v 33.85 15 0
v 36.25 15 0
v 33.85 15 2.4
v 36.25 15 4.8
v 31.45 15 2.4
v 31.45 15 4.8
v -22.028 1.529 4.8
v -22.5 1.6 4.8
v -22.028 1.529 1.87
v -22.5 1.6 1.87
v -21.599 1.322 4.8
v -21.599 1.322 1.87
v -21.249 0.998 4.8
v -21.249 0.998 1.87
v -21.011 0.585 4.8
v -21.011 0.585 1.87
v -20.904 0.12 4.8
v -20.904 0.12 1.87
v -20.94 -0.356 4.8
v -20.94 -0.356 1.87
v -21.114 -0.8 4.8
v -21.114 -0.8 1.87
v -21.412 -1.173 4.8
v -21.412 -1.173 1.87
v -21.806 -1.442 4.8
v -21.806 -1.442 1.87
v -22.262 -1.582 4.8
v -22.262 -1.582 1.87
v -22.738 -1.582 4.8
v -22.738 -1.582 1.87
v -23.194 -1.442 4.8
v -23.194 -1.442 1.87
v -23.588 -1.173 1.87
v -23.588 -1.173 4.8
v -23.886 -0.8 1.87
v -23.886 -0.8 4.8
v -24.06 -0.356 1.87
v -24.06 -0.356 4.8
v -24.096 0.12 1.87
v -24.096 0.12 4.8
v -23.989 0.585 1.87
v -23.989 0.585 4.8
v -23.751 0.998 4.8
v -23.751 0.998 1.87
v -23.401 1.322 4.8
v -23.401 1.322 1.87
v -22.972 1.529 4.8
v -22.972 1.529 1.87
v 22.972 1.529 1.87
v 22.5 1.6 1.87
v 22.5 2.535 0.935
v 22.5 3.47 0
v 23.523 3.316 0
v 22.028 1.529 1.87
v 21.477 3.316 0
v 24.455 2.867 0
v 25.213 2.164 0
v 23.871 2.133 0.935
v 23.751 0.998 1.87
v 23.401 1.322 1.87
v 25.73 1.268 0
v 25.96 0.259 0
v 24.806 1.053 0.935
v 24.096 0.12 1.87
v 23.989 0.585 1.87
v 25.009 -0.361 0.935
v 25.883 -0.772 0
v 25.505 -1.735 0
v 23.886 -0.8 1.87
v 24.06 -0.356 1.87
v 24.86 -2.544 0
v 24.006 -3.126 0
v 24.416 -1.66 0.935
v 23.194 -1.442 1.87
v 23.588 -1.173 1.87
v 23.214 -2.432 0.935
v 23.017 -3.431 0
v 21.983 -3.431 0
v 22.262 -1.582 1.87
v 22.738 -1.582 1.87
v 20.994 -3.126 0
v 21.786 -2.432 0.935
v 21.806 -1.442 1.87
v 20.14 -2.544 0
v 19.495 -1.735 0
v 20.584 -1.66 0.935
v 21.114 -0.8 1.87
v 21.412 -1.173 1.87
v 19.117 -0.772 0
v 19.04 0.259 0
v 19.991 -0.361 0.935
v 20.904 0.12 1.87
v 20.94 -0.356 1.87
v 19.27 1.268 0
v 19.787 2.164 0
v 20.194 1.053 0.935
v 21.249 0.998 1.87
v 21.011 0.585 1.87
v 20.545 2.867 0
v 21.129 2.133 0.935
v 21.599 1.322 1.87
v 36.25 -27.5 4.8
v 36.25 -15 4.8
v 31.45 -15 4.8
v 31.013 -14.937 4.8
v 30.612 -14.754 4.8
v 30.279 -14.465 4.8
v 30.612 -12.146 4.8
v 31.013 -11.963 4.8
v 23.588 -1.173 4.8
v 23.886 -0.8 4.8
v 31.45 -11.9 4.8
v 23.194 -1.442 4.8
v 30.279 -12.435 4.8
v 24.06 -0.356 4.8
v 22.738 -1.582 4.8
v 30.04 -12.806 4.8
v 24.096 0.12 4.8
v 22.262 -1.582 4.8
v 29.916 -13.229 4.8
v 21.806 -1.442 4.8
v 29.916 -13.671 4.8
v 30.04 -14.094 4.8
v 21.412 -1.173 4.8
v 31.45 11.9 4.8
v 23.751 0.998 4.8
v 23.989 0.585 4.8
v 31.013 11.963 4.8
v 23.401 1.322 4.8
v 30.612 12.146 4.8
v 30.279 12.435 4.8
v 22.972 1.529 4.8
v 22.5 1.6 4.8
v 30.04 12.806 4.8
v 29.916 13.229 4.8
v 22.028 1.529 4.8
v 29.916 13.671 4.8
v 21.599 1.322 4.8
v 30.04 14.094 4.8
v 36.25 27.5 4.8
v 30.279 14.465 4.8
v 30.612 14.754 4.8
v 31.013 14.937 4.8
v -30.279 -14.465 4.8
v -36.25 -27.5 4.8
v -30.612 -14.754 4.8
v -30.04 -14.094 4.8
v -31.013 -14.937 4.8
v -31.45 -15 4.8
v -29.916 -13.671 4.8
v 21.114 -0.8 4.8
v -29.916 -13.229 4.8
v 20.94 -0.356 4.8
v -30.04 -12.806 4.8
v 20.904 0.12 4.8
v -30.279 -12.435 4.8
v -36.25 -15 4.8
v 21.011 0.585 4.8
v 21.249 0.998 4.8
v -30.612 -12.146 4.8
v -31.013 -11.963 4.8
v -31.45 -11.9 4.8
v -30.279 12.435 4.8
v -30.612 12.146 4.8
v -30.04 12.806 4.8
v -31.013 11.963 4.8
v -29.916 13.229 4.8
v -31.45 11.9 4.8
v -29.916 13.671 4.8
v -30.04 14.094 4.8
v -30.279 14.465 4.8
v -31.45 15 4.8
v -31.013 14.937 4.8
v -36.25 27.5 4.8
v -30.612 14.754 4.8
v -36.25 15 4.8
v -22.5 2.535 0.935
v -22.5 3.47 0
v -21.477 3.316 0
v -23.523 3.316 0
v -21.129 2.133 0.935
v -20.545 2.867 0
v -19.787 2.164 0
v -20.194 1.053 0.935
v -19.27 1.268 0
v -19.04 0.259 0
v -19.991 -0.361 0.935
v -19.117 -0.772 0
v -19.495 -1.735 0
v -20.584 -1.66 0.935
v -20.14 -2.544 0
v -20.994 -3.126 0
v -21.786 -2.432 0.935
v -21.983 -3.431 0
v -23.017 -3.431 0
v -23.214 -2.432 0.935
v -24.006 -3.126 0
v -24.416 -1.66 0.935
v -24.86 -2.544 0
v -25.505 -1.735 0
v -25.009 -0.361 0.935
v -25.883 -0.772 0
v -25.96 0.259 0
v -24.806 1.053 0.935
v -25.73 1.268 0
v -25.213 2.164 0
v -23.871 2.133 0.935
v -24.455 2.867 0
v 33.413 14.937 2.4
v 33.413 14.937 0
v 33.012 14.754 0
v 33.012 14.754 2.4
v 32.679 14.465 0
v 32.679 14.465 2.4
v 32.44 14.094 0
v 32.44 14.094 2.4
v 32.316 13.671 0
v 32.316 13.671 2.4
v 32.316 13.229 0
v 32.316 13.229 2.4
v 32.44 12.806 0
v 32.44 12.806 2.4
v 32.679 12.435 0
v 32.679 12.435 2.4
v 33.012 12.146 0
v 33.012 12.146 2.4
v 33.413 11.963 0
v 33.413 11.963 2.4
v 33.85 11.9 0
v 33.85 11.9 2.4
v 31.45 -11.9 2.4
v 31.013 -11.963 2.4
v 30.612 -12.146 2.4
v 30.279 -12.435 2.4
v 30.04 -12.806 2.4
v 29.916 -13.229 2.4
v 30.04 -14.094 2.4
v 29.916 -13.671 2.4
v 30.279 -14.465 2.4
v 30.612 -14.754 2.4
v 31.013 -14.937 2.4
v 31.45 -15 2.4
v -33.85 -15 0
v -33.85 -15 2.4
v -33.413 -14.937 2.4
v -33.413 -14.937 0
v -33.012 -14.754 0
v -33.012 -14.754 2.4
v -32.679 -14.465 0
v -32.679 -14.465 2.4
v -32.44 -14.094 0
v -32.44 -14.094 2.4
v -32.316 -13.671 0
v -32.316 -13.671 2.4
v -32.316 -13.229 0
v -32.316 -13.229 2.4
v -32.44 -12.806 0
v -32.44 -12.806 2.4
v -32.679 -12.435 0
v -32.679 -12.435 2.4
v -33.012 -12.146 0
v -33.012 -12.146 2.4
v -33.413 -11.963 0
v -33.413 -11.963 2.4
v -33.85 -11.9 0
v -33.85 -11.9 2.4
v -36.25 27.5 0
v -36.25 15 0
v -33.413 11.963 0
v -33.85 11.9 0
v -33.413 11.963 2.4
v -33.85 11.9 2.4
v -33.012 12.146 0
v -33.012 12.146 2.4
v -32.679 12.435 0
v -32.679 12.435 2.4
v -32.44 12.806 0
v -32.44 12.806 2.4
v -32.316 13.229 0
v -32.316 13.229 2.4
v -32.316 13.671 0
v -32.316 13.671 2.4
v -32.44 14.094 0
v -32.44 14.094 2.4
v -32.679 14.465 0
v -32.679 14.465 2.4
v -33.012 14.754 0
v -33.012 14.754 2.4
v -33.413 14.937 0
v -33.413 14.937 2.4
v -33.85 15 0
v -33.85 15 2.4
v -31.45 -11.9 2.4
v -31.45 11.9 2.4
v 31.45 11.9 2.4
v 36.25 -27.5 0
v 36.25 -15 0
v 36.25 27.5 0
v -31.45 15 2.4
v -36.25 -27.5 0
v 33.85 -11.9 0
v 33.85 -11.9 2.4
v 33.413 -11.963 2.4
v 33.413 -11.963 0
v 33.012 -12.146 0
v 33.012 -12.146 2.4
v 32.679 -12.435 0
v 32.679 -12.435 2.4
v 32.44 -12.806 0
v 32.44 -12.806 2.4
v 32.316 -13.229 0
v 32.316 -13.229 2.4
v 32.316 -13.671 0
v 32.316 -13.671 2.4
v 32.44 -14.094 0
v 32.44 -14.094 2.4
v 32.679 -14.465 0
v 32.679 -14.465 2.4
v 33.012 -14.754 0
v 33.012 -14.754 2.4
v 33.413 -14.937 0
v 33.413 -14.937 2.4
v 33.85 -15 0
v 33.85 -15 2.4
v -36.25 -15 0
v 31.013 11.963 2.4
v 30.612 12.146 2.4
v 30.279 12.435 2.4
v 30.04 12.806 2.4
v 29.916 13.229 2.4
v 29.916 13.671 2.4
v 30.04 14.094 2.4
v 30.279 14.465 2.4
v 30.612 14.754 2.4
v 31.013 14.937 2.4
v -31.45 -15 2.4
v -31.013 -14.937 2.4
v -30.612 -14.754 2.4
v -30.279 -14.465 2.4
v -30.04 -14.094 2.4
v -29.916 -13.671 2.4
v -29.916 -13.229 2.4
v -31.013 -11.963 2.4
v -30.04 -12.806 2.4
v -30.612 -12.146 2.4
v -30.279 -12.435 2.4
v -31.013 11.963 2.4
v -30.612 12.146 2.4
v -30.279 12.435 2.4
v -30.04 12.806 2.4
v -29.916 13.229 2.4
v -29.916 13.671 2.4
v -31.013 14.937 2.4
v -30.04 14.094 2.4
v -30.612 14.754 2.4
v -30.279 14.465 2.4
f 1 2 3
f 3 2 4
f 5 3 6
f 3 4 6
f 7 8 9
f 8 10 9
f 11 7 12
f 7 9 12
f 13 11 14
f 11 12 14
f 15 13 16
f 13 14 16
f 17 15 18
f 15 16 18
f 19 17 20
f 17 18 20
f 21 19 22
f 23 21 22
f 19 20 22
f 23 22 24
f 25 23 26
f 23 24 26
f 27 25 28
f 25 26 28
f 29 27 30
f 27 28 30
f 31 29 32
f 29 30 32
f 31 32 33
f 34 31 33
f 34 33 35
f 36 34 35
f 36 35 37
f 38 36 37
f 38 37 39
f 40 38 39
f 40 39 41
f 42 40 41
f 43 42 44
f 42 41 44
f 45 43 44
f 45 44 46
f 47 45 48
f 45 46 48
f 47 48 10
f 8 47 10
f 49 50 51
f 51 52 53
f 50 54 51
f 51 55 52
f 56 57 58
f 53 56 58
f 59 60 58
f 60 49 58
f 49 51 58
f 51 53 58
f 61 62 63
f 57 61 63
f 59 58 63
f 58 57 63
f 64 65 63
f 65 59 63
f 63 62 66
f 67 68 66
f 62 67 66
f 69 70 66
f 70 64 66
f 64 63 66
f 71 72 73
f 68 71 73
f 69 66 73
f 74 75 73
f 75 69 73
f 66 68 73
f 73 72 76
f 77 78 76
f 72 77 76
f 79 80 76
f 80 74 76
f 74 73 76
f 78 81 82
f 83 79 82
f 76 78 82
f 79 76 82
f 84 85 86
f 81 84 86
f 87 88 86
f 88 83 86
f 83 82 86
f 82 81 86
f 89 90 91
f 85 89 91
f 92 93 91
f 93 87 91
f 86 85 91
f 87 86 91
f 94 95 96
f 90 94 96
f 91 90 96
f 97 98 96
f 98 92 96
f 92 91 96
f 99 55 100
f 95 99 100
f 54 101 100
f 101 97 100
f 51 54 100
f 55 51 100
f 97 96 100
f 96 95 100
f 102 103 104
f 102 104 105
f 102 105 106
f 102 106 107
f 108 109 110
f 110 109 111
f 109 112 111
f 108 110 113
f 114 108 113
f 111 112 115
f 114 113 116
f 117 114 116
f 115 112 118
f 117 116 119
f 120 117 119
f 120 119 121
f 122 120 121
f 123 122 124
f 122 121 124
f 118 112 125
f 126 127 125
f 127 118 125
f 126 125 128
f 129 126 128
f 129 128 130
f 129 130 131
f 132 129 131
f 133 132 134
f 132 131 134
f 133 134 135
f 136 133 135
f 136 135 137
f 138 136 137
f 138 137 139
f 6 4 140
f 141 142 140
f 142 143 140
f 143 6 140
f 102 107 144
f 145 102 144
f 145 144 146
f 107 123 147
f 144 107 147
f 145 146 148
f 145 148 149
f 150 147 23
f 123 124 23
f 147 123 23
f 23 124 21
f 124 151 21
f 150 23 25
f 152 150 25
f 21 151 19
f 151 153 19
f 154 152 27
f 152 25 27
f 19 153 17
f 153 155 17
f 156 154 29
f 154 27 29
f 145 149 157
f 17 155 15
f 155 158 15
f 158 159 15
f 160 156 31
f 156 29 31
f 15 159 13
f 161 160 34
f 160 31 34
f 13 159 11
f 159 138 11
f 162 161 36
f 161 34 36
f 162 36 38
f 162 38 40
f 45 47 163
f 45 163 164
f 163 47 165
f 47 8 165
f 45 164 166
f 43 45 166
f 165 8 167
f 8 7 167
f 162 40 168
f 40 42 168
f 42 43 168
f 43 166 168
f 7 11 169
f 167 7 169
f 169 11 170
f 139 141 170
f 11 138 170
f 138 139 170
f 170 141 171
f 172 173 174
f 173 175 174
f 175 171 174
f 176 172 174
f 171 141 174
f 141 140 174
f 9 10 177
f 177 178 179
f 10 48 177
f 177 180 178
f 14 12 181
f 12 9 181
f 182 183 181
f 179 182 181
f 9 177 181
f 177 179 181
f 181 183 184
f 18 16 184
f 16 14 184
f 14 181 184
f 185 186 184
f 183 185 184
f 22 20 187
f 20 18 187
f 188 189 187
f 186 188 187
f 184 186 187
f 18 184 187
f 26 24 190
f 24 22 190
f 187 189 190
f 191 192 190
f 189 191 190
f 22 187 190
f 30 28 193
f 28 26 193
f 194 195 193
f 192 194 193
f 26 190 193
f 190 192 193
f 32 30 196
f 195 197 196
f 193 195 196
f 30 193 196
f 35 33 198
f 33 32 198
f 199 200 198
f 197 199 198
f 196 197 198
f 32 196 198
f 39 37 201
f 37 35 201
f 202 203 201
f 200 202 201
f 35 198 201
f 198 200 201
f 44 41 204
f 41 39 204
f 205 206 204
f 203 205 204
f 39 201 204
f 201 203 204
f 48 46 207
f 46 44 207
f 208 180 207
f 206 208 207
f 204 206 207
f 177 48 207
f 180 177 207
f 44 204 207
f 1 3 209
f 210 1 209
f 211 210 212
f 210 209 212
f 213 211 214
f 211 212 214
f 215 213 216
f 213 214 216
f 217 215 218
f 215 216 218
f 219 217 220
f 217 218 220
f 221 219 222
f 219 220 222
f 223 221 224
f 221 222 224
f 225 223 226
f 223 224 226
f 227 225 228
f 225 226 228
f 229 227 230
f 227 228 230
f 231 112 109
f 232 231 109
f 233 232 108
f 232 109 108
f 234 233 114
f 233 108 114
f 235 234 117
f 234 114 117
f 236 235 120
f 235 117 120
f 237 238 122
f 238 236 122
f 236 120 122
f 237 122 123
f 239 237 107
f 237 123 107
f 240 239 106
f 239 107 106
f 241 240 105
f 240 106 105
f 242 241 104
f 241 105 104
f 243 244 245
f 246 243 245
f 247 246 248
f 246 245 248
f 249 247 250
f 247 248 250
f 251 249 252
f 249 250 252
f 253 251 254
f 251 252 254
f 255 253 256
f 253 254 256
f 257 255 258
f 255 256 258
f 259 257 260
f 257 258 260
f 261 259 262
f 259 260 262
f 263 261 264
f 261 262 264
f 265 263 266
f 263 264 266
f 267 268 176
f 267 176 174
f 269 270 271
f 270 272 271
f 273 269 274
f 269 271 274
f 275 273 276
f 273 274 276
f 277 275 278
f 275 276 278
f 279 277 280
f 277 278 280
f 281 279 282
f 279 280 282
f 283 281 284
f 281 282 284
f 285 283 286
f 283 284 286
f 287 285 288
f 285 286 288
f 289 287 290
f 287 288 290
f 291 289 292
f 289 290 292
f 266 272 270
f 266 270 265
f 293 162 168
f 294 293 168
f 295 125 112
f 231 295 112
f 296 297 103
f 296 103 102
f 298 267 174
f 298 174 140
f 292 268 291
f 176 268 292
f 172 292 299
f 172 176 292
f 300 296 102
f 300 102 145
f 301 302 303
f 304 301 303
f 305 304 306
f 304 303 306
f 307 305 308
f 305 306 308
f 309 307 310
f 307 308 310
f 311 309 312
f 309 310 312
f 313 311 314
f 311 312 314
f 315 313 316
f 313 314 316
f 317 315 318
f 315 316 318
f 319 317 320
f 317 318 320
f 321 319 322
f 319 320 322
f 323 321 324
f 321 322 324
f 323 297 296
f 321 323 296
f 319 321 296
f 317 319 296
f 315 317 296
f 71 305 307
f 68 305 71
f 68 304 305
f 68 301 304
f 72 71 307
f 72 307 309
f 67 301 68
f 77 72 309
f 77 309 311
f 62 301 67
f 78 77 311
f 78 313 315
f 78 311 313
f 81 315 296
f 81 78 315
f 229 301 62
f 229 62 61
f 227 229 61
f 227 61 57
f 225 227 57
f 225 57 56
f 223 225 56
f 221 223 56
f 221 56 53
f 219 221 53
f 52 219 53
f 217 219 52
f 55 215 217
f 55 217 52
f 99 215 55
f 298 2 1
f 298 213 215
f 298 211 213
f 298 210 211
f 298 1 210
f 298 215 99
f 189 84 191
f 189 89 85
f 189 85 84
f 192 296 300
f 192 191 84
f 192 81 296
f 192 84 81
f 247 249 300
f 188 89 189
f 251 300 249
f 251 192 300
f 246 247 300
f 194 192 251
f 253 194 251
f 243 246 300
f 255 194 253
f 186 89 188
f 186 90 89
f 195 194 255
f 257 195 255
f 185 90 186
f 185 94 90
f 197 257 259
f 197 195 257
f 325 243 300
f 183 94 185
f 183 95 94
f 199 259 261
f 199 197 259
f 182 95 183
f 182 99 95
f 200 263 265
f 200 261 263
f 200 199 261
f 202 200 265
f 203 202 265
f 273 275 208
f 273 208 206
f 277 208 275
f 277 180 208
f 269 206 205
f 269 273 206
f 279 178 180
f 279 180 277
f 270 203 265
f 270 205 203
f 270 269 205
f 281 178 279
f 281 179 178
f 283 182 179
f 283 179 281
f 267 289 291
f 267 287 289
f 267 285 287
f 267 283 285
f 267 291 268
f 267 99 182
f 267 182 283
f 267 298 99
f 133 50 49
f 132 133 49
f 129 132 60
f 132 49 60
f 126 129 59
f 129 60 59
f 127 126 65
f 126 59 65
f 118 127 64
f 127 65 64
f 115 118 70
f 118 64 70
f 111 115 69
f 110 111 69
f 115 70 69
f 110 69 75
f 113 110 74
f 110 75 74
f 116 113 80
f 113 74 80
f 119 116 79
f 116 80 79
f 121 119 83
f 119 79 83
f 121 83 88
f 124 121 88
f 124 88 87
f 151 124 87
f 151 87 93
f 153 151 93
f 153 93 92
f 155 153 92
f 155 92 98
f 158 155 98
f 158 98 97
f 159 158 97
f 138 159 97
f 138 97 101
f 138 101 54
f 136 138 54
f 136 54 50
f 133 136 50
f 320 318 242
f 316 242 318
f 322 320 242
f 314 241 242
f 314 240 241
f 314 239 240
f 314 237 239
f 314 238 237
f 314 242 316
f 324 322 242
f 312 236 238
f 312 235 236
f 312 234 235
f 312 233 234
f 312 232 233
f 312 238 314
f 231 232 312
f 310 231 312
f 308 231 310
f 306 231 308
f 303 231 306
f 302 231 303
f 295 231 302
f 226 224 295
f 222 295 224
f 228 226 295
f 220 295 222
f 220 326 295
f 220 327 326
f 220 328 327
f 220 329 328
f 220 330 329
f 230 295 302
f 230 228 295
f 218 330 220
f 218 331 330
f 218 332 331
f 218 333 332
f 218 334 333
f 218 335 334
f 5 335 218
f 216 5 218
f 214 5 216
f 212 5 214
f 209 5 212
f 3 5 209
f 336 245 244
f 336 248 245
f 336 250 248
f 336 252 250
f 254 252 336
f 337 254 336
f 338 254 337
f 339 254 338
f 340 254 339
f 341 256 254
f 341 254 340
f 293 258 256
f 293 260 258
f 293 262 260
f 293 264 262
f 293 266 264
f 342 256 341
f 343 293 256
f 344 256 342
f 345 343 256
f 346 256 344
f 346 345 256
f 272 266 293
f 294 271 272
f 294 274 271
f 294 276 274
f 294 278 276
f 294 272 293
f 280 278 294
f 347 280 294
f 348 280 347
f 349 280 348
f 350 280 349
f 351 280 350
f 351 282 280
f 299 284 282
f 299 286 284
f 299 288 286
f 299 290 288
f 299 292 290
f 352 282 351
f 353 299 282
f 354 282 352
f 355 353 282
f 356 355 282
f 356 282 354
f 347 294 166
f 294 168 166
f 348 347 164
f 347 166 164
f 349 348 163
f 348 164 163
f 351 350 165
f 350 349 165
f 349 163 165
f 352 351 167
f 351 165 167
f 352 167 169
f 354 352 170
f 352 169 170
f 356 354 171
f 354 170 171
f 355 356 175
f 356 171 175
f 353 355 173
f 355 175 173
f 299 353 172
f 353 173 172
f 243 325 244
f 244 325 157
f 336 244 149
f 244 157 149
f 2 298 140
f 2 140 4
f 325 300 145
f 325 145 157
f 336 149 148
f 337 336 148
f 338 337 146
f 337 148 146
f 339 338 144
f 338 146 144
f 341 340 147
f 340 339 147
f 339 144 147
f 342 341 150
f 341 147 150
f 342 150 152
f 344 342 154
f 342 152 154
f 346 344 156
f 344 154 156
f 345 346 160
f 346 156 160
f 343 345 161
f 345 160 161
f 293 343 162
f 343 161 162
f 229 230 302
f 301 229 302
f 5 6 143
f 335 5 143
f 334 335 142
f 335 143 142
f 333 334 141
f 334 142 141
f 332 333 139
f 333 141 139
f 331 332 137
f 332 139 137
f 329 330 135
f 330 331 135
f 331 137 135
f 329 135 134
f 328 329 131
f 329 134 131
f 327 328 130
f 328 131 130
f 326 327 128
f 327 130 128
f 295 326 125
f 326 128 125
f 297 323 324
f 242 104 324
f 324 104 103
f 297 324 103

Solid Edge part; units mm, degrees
sketch "Sketch1" plane through (0, 0, 0) normal (0, 0, 1) x (1, 0, 0)
  line L0 (-36.25, 27.5) -> (36.25, 27.5)
  line L1 (36.25, 27.5) -> (36.25, -27.5)
  line L2 (36.25, -27.5) -> (-36.25, -27.5)
  line L3 (-36.25, -27.5) -> (-36.25, 27.5)
extrude "ExtrudedProtrusion_7" add sketch "Sketch1" along normal blind 4.8
sketch "Sketch2" plane through (0, 0, 4.8) normal (0, 0, 1) x (1, 0, 0)
  line L0 (-33.85, -15) -> (-31.45, -15)
  line L1 (-31.45, -11.9) -> (-31.45, 11.9)
  line L2 (-33.85, 15) -> (-31.45, 15)
  line L3 (-33.85, 15) -> (-33.85, -15)
  arc A0 (-31.45, -11.9) -> (-31.45, -15) centre (-31.45, -13.45) cw
  arc A1 (-31.45, 15) -> (-31.45, 11.9) centre (-31.45, 13.45) cw
  line L4 (31.45, -15) -> (33.85, -15)
  line L5 (33.85, -15) -> (33.85, 15)
  line L6 (33.85, 15) -> (31.45, 15)
  line L7 (31.45, 11.9) -> (31.45, -11.9)
  arc A2 (31.45, 11.9) -> (31.45, 15) centre (31.45, 13.45) cw
  arc A3 (31.45, -15) -> (31.45, -11.9) centre (31.45, -13.45) cw
extrude "ExtrudedCutout_13" cut sketch "Sketch2" against normal blind 2.4
sketch "Sketch3" plane through (0, 0, 4.8) normal (0, 0, 1) x (1, 0, 0)
  line L0 (-33.85, 11.9) -> (-33.85, -11.9)
  line L1 (-36.25, -15) -> (-33.85, -15)
  line L2 (-36.25, 15) -> (-36.25, -15)
  line L3 (-36.25, 15) -> (-33.85, 15)
  arc A0 (-33.85, 15) -> (-33.85, 11.9) centre (-33.85, 13.45) cw
  arc A1 (-33.85, -11.9) -> (-33.85, -15) centre (-33.85, -13.45) cw
  line L4 (36.25, 15) -> (33.85, 15)
  line L5 (36.25, -15) -> (36.25, 15)
  line L6 (33.85, -15) -> (36.25, -15)
  line L7 (33.85, 11.9) -> (33.85, -11.9)
  arc A2 (33.85, 11.9) -> (33.85, 15) centre (33.85, 13.45) cw
  arc A3 (33.85, -15) -> (33.85, -11.9) centre (33.85, -13.45) cw
extrude "ExtrudedCutout_14" cut sketch "Sketch3" against normal blind 4.8
hole "Hole_5" at (-22.5, 0, 0) direction (0, 0, 1) diameter 3.2 end up to next countersink diameter 6.94 countersink angle 90
hole "Hole1" at (22.5, 0, 0) direction (0, 0, 1) diameter 3.2 end up to next countersink diameter 6.94 countersink angle 90
properties material "Polycarbonate"
